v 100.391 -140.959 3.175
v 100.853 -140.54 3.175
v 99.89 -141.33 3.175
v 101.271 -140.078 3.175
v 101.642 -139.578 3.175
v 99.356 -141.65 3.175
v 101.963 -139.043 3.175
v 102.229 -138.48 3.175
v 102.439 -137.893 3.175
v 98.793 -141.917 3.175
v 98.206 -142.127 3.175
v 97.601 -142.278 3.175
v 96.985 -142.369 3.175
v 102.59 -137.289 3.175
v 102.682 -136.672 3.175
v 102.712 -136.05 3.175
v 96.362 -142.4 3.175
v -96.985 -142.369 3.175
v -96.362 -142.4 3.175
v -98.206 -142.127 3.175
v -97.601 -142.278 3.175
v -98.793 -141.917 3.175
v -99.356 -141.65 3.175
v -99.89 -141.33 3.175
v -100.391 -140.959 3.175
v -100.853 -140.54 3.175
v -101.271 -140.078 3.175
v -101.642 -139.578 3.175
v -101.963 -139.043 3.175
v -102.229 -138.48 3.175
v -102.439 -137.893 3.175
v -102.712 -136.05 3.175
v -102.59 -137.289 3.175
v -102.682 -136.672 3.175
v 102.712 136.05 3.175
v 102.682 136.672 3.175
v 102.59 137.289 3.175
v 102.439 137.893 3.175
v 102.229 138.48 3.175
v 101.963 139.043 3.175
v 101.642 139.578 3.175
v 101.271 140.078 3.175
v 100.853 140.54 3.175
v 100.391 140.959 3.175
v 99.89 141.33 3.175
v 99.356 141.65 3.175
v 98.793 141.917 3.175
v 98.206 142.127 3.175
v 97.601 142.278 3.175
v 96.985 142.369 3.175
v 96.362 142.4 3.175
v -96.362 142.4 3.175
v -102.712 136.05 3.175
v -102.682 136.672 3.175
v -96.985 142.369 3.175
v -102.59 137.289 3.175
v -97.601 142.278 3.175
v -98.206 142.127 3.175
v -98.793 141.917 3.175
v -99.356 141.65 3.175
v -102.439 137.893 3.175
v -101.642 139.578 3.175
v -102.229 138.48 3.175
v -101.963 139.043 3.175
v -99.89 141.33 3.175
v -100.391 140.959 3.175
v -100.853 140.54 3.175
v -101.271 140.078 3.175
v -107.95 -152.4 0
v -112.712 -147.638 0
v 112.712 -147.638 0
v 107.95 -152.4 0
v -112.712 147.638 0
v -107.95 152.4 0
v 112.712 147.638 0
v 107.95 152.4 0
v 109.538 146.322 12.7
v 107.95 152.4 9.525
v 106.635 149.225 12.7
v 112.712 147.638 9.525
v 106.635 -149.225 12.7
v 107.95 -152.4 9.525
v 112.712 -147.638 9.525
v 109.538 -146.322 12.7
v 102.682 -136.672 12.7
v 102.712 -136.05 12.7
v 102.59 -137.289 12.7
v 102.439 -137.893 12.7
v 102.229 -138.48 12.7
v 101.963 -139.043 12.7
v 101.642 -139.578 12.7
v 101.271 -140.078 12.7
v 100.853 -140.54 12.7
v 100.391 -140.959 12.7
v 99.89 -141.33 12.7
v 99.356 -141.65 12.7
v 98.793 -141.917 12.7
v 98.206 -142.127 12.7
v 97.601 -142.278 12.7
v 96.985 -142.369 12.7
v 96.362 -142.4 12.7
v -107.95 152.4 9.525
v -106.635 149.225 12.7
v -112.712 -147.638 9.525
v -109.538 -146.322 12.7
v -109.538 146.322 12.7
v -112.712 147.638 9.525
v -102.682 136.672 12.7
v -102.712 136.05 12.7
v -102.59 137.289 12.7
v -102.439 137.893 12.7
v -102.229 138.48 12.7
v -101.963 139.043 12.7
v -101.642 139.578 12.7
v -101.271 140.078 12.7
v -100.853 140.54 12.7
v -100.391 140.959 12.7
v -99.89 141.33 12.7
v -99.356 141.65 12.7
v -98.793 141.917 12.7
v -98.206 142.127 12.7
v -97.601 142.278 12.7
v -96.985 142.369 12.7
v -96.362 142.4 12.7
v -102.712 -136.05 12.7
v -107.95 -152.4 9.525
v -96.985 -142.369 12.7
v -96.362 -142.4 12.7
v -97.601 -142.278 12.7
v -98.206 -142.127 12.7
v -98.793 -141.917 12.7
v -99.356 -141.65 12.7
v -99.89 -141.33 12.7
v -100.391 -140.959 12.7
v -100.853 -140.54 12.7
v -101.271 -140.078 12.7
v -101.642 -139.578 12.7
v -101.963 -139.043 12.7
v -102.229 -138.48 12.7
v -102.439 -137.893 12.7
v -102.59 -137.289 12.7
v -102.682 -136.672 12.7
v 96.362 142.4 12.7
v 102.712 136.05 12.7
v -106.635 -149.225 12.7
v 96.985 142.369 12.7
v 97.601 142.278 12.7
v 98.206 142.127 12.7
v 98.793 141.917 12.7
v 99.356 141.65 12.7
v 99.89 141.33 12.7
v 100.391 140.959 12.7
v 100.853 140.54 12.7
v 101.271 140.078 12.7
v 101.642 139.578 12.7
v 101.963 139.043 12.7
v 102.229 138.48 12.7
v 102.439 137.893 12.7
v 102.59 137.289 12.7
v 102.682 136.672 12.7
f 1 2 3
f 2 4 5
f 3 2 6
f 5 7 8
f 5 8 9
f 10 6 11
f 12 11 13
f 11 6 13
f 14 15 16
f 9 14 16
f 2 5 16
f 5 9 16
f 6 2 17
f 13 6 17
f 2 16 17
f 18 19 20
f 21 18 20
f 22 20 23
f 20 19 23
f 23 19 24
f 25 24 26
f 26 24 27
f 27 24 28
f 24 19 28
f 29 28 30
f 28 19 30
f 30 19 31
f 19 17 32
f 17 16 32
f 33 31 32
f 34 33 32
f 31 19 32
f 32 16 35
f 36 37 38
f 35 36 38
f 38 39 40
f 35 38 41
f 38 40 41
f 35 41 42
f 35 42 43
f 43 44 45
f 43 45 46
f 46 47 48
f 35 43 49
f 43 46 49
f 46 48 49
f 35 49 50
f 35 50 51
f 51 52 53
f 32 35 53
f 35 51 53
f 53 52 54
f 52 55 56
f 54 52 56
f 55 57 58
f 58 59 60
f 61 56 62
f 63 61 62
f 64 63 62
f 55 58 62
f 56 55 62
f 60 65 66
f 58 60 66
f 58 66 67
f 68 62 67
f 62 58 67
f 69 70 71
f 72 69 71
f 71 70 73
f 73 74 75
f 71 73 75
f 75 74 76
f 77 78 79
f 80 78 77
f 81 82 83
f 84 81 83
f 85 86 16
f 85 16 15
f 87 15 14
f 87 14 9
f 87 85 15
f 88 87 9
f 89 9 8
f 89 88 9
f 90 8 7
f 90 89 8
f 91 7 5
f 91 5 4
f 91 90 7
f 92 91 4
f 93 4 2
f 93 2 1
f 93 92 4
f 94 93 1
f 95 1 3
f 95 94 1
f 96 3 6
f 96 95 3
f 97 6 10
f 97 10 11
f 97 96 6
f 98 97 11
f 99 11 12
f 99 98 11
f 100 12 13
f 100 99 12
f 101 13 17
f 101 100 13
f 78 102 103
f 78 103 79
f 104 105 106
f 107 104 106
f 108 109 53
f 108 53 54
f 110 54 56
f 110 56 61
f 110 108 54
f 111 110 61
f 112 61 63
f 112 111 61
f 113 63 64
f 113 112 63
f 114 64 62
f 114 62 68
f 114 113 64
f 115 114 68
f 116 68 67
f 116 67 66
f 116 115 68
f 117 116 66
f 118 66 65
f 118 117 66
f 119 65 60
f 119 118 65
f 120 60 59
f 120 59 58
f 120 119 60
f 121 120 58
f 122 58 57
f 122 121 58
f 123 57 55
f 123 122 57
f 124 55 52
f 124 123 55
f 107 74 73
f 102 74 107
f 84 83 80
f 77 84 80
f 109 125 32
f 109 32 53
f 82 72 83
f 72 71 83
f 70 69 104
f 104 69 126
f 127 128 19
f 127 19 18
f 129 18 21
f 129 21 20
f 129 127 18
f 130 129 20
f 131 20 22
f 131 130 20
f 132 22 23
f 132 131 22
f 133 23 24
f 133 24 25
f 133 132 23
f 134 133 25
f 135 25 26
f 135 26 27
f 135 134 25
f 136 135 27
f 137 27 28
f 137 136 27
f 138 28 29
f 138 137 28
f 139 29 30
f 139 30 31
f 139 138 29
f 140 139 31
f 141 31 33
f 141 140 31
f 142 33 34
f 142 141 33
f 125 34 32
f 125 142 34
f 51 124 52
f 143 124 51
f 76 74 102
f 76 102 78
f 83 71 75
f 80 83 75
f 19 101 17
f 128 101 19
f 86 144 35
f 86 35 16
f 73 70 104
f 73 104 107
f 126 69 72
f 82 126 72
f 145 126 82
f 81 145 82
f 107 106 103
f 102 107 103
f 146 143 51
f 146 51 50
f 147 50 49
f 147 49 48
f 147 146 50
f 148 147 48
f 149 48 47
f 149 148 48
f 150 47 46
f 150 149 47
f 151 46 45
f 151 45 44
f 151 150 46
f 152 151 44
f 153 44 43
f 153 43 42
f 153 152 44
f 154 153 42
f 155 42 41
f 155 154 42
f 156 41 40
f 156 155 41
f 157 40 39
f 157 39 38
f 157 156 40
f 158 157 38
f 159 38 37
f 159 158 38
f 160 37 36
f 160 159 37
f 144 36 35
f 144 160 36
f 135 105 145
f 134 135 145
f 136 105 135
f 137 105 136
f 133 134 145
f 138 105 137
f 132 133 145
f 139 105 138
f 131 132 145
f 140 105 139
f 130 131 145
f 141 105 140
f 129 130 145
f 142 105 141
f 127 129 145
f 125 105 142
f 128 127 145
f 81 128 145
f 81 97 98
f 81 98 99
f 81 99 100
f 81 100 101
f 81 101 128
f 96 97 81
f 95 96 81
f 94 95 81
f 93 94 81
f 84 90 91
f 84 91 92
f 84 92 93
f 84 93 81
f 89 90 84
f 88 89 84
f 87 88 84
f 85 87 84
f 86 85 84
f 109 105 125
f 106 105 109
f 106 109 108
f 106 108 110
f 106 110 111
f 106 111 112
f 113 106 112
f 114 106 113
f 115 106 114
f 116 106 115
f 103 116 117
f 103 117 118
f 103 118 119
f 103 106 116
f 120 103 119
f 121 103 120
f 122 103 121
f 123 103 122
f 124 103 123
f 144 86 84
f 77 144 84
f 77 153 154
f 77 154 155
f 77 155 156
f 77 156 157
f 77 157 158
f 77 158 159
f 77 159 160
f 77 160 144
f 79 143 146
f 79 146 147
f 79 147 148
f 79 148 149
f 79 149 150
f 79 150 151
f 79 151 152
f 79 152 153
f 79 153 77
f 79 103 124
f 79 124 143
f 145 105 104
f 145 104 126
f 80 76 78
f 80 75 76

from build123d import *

# Parameters (mm, degrees)
SKETCH1_W           = 225.425
SKETCH1_H           = 304.8
BOSS_EXTRUDE1_DEPTH = 12.7
CUT_EXTRUDE1_DEPTH  = 9.525
CHAMFER2_SIZE       = 4.7625
CHAMFER1_SIZE       = 3.175


with BuildPart() as part:
    # Sketch1 → Boss-Extrude1 (new body)
    with BuildSketch(Plane.XY):
        Rectangle(SKETCH1_W, SKETCH1_H)
    extrude(amount=BOSS_EXTRUDE1_DEPTH)

    # Sketch2 → Cut-Extrude1 (cut)
    with BuildSketch(Plane.XY.offset(12.7)):
        with BuildLine():
            Line((96.3625, -142.4), (-96.3625, -142.4))
            ThreePointArc((-96.3625, -142.4), (-100.852628061, -140.540128061), (-102.7125, -136.05))
            Line((-102.7125, -136.05), (-102.7125, 136.05))
            ThreePointArc((-102.7125, 136.05), (-100.852628061, 140.540128061), (-96.3625, 142.4))
            Line((-96.3625, 142.4), (96.3625, 142.4))
            ThreePointArc((96.3625, 142.4), (100.852628061, 140.540128061), (102.7125, 136.05))
            Line((102.7125, 136.05), (102.7125, -136.05))
            ThreePointArc((102.7125, -136.05), (100.852628061, -140.540128061), (96.3625, -142.4))
        make_face()
    extrude(amount=-CUT_EXTRUDE1_DEPTH, mode=Mode.SUBTRACT)

    # Chamfer2
    chamfer2_edges = [part.edges().sort_by_distance(p)[0] for p in [
        (-112.7125, 152.4, 6.35),
        (112.7125, 152.4, 6.35),
        (112.7125, -152.4, 6.35),
        (-112.7125, -152.4, 6.35),
    ]]
    chamfer(chamfer2_edges, length=CHAMFER2_SIZE)

    # Chamfer1
    chamfer1_edges = [part.edges().sort_by_distance(p)[0] for p in [
        (0, -152.4, 12.7),
        (-112.7125, 0, 12.7),
        (112.7125, 0, 12.7),
        (0, 152.4, 12.7),
        (110.33125, 150.01875, 12.7),
        (110.33125, -150.01875, 12.7),
        (-110.33125, 150.01875, 12.7),
        (-110.33125, -150.01875, 12.7),
    ]]
    chamfer(chamfer1_edges, length=CHAMFER1_SIZE)


solid = part.part
